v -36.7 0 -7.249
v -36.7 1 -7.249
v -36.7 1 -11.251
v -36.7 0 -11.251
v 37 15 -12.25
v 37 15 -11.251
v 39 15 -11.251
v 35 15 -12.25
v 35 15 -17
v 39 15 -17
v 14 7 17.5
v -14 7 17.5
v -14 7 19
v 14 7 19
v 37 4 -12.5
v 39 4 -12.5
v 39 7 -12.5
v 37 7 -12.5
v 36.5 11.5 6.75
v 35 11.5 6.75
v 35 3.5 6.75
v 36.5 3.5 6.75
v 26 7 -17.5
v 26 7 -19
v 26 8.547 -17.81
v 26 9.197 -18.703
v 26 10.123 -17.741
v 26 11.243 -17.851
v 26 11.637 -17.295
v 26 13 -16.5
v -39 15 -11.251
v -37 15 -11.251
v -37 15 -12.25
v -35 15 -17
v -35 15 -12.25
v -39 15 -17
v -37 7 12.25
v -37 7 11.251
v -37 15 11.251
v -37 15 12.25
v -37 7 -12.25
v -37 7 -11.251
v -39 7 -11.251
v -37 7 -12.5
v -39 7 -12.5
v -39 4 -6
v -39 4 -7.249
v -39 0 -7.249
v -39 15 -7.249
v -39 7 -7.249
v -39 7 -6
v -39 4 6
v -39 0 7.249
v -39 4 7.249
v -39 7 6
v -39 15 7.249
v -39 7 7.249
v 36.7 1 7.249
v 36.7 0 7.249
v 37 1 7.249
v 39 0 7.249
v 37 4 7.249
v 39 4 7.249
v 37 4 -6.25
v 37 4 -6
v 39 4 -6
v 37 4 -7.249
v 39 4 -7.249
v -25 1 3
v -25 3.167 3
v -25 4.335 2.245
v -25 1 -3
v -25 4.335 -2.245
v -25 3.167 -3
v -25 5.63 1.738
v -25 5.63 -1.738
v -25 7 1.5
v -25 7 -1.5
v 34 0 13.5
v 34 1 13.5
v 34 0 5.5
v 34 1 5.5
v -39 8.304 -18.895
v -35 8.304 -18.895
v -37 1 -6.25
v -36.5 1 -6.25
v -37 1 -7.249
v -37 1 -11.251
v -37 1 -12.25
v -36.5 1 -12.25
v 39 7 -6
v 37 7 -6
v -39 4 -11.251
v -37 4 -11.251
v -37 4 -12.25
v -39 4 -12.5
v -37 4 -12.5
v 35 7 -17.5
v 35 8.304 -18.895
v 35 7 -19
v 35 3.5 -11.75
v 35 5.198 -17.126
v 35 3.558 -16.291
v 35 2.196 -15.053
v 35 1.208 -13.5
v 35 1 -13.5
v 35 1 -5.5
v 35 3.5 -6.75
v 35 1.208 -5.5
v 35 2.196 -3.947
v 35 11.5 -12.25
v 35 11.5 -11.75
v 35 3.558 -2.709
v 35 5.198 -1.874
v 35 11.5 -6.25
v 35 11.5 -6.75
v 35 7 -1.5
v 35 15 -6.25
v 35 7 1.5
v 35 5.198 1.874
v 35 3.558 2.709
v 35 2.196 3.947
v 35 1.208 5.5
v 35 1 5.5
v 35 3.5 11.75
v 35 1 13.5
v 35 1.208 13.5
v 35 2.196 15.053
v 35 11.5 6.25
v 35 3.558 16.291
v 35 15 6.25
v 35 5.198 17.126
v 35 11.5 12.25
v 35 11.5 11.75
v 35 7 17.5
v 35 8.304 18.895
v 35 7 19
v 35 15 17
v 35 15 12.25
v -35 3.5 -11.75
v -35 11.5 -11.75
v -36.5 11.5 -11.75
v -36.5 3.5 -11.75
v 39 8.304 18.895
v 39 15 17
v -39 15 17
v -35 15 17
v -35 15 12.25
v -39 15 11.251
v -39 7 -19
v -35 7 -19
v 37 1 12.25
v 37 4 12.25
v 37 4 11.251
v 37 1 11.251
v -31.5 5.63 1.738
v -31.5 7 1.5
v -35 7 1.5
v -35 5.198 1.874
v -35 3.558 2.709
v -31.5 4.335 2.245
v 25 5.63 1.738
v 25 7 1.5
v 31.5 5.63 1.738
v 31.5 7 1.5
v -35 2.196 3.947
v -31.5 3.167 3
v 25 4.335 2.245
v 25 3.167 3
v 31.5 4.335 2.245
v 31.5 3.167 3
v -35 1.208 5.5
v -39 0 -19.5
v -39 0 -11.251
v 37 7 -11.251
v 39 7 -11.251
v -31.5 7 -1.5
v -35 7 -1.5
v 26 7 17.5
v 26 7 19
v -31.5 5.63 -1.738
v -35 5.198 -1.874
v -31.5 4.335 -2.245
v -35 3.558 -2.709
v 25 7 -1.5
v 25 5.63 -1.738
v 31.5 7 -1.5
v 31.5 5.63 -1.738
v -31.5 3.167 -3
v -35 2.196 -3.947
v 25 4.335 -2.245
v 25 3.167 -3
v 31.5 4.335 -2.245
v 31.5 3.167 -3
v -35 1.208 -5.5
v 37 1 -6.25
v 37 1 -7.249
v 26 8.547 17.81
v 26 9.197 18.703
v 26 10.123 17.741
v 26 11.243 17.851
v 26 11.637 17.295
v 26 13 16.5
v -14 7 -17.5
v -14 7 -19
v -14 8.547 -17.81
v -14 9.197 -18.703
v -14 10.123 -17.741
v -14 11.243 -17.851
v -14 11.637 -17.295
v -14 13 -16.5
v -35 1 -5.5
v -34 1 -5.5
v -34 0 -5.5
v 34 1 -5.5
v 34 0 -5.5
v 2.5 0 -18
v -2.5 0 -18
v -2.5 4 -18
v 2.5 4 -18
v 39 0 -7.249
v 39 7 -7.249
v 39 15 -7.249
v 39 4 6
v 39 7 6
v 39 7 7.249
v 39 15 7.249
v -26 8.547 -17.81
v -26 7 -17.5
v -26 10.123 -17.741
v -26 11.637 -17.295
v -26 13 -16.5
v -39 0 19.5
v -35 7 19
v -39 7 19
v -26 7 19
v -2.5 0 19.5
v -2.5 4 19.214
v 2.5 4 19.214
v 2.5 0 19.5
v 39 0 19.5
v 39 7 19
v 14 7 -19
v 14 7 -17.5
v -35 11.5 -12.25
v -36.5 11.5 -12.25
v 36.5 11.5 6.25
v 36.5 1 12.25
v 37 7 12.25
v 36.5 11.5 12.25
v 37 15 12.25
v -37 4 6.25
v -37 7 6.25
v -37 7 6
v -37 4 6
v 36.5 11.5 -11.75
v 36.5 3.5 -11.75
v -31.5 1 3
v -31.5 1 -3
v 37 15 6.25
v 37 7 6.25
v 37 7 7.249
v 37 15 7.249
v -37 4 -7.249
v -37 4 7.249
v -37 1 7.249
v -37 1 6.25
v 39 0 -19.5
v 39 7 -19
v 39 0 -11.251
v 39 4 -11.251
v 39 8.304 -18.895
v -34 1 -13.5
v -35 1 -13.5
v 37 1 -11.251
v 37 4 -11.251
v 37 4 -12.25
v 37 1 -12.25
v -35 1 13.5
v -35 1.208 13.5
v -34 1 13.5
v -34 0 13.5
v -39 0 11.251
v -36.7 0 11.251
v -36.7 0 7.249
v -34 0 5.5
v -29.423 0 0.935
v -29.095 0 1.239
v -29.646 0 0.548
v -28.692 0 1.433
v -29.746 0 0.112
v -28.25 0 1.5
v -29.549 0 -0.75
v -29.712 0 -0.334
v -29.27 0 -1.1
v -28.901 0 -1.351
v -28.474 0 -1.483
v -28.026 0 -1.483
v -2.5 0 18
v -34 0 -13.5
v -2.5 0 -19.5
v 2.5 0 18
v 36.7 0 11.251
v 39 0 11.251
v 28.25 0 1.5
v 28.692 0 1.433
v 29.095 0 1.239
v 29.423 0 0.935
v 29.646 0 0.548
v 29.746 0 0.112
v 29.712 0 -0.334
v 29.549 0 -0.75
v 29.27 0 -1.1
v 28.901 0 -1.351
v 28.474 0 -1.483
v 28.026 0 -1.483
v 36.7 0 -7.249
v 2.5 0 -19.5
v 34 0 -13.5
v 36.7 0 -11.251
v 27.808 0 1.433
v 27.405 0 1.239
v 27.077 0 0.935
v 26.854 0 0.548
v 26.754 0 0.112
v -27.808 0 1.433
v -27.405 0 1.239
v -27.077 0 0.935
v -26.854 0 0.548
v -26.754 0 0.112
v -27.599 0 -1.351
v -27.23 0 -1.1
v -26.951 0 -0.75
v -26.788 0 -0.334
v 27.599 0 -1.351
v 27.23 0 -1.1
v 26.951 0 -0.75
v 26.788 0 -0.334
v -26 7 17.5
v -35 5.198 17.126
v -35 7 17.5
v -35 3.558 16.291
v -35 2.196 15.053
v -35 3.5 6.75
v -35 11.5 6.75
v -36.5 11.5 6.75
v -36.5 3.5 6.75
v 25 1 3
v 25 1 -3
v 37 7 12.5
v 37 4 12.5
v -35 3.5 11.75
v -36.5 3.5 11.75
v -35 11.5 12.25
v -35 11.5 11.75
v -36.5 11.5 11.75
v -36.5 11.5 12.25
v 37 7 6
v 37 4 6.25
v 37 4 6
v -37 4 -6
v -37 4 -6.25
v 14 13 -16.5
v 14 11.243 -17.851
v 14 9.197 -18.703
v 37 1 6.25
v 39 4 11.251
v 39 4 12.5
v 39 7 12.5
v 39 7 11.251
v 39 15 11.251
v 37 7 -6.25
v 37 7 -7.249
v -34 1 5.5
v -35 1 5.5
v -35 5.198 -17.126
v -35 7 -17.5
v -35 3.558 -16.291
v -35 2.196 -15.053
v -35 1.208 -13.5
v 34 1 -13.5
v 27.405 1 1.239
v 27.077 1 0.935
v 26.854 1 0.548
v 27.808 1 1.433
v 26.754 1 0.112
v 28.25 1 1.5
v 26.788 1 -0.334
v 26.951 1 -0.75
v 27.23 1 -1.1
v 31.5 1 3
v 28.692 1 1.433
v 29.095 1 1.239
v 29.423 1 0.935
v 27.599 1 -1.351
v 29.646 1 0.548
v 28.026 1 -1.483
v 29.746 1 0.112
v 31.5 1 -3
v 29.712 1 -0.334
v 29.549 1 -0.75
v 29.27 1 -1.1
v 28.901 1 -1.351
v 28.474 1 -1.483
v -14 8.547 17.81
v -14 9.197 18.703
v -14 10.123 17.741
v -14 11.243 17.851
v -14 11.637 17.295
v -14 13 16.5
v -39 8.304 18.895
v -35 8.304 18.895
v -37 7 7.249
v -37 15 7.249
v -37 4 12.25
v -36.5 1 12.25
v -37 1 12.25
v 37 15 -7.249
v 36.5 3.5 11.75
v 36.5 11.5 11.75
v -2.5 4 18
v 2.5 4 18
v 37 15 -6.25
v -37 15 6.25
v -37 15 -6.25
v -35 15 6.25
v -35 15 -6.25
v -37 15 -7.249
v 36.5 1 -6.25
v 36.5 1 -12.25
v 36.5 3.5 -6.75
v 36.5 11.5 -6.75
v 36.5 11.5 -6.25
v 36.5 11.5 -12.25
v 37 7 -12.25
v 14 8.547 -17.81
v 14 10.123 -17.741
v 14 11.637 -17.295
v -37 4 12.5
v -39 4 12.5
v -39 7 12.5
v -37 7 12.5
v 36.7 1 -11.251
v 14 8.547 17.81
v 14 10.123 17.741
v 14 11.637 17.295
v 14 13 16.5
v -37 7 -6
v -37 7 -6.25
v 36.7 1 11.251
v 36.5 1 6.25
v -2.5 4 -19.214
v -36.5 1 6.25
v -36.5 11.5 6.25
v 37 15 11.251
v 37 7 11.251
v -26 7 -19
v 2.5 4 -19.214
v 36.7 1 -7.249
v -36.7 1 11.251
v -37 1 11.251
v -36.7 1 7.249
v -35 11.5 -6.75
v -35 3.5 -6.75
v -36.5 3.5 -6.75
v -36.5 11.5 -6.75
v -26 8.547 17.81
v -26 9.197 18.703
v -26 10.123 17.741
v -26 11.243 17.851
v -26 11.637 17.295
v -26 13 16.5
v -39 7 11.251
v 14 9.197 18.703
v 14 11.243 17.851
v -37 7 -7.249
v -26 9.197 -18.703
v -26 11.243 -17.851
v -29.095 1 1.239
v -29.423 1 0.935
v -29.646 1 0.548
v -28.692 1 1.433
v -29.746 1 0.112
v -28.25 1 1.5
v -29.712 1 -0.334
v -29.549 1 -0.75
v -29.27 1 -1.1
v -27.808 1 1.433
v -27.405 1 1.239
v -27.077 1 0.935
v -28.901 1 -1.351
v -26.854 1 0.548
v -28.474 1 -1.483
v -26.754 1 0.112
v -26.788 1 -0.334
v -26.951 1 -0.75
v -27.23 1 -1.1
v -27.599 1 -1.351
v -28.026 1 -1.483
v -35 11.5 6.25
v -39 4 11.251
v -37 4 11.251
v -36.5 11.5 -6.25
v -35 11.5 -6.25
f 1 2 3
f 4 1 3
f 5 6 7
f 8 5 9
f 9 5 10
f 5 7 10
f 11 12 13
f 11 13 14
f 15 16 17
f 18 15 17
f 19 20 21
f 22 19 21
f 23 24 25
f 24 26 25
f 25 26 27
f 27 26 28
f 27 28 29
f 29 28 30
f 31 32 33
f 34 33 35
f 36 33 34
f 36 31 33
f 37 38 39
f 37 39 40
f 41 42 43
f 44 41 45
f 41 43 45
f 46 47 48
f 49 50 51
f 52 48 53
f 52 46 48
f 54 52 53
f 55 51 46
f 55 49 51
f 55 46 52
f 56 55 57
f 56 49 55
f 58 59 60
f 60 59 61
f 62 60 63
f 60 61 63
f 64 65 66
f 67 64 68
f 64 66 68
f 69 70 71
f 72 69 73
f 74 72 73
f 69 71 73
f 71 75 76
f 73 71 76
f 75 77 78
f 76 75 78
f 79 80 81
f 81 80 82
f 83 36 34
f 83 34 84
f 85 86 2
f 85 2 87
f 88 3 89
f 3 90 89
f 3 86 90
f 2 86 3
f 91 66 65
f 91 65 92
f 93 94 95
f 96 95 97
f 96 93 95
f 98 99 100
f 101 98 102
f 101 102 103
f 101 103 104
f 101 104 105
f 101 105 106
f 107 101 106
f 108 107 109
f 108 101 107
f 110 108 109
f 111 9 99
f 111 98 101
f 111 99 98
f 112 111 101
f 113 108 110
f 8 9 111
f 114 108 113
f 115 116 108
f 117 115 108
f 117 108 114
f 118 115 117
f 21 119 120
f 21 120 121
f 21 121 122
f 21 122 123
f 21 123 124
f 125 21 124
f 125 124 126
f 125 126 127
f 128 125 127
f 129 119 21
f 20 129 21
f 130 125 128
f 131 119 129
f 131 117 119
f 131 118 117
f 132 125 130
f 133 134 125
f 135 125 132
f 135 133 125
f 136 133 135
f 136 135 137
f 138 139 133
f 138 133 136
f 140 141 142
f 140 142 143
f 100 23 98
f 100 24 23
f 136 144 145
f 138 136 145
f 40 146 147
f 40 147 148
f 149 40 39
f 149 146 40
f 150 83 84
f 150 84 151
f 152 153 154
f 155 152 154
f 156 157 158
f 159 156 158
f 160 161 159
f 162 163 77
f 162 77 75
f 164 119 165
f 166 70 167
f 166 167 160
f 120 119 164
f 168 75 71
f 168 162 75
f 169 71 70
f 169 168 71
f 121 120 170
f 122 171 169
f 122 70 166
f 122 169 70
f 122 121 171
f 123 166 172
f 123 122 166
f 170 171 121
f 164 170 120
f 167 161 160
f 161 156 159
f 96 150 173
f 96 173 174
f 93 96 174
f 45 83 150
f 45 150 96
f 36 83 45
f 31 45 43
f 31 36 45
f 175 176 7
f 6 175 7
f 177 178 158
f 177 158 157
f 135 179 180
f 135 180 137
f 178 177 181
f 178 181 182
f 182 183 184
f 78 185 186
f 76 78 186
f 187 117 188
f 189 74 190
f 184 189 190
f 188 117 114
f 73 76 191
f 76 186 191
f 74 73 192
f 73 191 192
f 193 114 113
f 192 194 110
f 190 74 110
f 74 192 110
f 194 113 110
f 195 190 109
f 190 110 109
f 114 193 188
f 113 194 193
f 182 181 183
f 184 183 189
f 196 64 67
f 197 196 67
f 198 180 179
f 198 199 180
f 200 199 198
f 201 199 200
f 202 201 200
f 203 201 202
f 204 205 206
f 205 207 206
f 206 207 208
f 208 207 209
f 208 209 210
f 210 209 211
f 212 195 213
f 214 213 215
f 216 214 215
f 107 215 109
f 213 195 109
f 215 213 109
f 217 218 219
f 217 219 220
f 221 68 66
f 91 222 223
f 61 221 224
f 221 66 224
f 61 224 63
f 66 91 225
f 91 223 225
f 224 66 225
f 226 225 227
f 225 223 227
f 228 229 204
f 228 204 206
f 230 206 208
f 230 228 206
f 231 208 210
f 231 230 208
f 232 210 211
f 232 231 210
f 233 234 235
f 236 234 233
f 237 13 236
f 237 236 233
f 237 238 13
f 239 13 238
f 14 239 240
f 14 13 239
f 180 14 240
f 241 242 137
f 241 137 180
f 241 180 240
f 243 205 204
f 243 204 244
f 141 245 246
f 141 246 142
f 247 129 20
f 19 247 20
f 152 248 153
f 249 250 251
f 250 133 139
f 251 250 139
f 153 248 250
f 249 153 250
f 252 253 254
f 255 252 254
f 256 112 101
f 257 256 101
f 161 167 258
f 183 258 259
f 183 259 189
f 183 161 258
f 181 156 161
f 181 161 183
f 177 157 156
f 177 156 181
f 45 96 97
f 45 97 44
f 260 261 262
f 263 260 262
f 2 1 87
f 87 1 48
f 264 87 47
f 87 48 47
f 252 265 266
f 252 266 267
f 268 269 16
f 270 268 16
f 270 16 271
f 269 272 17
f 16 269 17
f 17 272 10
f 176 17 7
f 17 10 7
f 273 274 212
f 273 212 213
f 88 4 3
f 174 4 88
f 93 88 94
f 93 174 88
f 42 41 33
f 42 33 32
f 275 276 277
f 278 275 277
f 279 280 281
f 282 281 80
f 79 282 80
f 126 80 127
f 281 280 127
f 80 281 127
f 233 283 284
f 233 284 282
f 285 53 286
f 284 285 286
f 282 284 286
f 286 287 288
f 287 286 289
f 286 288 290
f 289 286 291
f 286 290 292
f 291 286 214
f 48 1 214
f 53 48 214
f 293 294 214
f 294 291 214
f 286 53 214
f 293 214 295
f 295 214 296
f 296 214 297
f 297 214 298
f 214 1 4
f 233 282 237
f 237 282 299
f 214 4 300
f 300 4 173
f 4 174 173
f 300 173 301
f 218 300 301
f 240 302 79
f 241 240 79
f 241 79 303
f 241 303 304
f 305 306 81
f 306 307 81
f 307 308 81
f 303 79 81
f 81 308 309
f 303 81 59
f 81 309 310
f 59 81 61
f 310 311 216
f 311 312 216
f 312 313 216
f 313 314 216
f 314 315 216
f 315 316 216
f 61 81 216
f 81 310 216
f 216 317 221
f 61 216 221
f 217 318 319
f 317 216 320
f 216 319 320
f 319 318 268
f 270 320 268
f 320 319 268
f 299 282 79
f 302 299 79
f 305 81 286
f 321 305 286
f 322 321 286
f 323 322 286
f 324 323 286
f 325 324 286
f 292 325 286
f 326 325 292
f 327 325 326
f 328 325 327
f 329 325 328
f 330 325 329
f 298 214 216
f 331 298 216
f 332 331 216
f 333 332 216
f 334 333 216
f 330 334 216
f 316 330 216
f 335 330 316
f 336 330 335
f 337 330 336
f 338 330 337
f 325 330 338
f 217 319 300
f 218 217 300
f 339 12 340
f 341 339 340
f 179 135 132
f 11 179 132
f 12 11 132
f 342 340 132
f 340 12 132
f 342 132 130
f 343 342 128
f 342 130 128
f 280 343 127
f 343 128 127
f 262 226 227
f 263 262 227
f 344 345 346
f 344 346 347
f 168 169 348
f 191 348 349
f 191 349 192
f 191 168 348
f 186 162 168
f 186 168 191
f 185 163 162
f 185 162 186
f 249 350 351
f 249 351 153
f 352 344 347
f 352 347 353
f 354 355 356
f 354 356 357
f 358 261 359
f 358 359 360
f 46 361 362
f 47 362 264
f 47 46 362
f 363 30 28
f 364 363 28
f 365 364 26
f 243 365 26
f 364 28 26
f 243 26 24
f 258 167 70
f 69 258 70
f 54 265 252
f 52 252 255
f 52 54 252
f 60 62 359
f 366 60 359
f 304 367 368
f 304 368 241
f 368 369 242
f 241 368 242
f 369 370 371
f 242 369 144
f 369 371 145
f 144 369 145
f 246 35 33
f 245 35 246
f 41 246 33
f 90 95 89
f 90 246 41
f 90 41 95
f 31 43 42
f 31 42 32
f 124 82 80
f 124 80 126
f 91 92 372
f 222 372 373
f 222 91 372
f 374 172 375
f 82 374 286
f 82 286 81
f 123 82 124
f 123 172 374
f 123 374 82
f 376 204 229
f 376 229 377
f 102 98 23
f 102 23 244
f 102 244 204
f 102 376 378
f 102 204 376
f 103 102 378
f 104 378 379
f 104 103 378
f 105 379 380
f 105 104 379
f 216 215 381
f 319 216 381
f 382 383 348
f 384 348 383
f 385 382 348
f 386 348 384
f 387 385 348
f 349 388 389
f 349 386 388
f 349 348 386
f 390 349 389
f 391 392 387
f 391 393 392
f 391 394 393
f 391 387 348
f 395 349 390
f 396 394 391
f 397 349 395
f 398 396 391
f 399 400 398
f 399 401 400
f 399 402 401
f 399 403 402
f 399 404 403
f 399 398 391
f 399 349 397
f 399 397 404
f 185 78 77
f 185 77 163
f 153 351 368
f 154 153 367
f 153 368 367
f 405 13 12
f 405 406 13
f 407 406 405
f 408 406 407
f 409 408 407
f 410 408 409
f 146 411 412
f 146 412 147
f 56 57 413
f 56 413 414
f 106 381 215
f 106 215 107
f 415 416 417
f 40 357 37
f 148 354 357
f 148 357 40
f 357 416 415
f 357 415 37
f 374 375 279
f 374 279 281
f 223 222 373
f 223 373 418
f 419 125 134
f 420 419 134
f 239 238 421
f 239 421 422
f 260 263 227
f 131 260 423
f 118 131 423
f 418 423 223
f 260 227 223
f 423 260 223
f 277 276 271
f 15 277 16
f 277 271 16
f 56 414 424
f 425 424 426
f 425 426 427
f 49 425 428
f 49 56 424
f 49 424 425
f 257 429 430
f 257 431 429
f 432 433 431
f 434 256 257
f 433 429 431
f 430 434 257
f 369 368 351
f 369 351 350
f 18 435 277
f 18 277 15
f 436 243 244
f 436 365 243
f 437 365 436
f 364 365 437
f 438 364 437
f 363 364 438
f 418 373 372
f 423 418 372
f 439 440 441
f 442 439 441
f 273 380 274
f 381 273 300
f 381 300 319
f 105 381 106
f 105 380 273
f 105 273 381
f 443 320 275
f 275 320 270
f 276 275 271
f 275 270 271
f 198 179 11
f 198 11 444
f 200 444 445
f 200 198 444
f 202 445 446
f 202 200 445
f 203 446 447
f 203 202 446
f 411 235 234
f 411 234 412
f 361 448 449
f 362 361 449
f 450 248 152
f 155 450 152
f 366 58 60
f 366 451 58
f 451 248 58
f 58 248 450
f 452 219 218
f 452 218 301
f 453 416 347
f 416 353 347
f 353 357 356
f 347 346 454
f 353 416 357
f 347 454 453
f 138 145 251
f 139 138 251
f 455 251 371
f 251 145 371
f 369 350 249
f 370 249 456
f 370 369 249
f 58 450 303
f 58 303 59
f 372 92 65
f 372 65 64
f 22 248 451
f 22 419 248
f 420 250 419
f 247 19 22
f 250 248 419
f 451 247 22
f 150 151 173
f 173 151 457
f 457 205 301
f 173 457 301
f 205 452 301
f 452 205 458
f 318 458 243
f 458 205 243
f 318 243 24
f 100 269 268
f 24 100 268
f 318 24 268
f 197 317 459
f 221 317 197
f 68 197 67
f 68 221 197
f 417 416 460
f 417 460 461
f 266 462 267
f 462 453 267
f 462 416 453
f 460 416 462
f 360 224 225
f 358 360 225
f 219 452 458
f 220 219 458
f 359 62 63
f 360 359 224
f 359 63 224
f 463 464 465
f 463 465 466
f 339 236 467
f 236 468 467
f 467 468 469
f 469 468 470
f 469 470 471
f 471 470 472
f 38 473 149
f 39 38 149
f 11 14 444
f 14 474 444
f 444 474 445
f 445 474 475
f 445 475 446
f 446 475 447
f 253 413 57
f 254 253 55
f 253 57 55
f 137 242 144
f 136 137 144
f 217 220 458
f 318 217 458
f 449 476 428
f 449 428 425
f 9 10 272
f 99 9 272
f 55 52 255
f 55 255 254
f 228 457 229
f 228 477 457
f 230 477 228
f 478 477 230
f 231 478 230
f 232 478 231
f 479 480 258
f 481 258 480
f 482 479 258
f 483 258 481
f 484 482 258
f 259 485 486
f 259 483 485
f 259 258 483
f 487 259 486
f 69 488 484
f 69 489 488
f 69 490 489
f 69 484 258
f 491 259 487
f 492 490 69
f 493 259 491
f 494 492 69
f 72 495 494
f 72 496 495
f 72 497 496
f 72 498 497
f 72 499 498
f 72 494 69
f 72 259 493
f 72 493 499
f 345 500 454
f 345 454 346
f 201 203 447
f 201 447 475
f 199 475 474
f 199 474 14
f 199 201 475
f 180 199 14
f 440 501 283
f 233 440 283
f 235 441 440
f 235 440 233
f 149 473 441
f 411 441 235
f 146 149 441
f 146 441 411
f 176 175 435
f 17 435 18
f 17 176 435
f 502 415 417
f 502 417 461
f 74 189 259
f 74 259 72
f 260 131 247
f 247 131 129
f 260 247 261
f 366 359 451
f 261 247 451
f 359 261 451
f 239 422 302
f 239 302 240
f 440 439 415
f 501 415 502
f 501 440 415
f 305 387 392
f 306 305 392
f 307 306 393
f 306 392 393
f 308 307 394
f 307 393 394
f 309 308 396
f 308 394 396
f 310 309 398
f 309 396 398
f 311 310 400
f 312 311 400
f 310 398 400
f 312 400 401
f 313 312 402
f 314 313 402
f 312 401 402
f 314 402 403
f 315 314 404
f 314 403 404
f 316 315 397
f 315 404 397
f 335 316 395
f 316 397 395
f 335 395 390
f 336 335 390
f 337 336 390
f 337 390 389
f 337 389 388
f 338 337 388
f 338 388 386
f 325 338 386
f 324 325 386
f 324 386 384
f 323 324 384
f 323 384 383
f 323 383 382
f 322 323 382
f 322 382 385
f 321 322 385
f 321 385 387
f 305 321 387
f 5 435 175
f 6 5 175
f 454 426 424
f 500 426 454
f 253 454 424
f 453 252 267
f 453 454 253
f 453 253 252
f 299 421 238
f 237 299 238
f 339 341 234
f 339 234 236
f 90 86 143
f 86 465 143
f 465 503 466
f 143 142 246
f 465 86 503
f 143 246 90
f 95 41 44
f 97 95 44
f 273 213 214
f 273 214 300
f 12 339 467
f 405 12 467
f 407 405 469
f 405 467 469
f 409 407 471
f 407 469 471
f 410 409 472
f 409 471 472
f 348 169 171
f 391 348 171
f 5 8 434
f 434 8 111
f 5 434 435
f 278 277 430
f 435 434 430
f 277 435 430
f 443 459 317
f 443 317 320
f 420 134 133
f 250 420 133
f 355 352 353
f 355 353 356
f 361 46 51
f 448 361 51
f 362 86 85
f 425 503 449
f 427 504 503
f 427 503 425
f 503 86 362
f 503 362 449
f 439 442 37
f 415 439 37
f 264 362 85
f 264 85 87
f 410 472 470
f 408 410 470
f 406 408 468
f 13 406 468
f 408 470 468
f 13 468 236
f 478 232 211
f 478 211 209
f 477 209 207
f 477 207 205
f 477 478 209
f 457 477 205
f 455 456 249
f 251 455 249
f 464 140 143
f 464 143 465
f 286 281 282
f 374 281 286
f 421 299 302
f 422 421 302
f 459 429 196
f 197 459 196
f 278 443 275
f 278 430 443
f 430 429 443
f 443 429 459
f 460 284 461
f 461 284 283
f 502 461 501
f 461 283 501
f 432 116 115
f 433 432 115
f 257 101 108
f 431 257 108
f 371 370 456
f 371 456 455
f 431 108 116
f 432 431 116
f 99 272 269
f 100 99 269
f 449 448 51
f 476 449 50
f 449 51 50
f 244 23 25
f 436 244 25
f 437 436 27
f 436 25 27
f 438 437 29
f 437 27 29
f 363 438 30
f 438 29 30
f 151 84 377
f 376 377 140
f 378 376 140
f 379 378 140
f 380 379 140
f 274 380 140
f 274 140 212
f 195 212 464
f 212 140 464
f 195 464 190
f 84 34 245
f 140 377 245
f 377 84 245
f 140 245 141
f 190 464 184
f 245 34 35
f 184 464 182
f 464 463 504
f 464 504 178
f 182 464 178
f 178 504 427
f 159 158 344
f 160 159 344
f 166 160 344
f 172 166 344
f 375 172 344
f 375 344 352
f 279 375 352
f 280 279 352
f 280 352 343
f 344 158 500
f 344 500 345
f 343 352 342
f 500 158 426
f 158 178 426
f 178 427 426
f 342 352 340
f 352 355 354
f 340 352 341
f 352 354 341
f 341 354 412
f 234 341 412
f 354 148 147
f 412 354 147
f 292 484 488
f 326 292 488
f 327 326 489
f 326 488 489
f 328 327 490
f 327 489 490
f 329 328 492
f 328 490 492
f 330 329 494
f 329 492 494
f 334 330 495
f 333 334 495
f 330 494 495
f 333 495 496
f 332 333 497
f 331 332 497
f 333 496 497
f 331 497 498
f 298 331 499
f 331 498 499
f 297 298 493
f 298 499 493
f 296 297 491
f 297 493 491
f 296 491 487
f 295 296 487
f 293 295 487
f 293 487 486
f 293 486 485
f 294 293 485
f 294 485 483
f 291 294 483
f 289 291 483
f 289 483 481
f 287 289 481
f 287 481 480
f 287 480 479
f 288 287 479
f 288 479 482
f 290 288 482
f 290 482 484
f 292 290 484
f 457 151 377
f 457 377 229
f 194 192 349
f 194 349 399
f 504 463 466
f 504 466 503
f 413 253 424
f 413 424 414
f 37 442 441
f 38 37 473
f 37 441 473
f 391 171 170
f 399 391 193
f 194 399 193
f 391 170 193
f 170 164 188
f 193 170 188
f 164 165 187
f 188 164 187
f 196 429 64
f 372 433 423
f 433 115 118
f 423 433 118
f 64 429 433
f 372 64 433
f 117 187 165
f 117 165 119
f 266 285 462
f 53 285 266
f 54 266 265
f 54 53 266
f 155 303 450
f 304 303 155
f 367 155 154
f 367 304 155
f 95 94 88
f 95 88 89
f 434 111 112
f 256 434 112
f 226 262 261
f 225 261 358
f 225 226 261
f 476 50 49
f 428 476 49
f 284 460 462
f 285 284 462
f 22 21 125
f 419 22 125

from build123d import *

# Parameters (mm, degrees)
SKETCH1_W            = 78
SKETCH1_H            = 39
BOSS_EXTRUDE1_DEPTH  = 7
CUT_EXTRUDE1_DEPTH   = 81.704708661
SKETCH3_W            = 70
SKETCH3_H            = 8
CUT_EXTRUDE2_DEPTH   = 6
CUT_EXTRUDE3_DEPTH   = 70
MIRROR9_COPY_1_DEPTH = 70
MIRROR9_COPY_2_DEPTH = 70
SKETCH5_W            = 68
SKETCH5_H            = 8
CUT_EXTRUDE4_DEPTH   = 45.014202253
BOSS_EXTRUDE2_DEPTH  = 12
MIRROR3_COPY_1_DEPTH = 12
BOSS_EXTRUDE3_DEPTH  = 4
SKETCH9_W            = 6.5
SKETCH9_H            = 3
CUT_EXTRUDE5_DEPTH   = 2
CUT_EXTRUDE6_DEPTH   = 2
SKETCH12_W           = 0.5
SKETCH12_H           = 6
CUT_EXTRUDE11_DEPTH  = 10.5
SKETCH13_W           = 4.001855858
SKETCH13_H           = 15
CUT_EXTRUDE9_DEPTH   = 2.3
SKETCH14_W           = 5
SKETCH14_H           = 1.5
CUT_EXTRUDE10_DEPTH  = 4
SKETCH15_W           = 6.5
SKETCH15_H           = 6
CUT_EXTRUDE12_DEPTH  = 6
CUT_EXTRUDE13_REACH  = 47.796
SKETCH16_R           = 1.5


with BuildPart() as part:
    # Sketch1 → Boss-Extrude1 (new body)
    with BuildSketch(Plane(origin=(0, 0, 0), x_dir=(1, 0, 0), z_dir=(0, 1, 0))):
        Rectangle(SKETCH1_W, SKETCH1_H)
    extrude(amount=BOSS_EXTRUDE1_DEPTH)

    # Sketch2 → Cut-Extrude1 (cut, through all)
    with BuildSketch(Plane(origin=(39, 0, 0), x_dir=(0, 0, -1), z_dir=(1, 0, 0))):
        Polygon((19, 7), (19.5, 0), (19.5, 7), align=None)
        Polygon((-19, 7), (-19.5, 0), (-19.5, 7), align=None)
    extrude(amount=-CUT_EXTRUDE1_DEPTH, mode=Mode.SUBTRACT)

    # Sketch3 → Cut-Extrude2 (cut)
    with BuildSketch(Plane(origin=(0, 7, 0), x_dir=(1, 0, 0), z_dir=(0, 1, 0))):
        with Locations((0, -9.5)):
            Rectangle(SKETCH3_W, SKETCH3_H)
        with Locations((0, 9.5)):
            Rectangle(SKETCH3_W, SKETCH3_H)
    extrude(amount=-CUT_EXTRUDE2_DEPTH, mode=Mode.SUBTRACT)

    # Sketch4 → Cut-Extrude3 (cut)
    with BuildSketch(Plane(origin=(35, 0, 0), x_dir=(0, 0, -1), z_dir=(1, 0, 0))):
        with BuildLine():
            Line((13, 1), (13, 7))
            Line((13, 7), (17.5, 7))
            ThreePointArc((17.5, 7), (16.132310367, 3.338267225), (13, 1))
        make_face()
    cut_extrude3 = extrude(amount=-CUT_EXTRUDE3_DEPTH, mode=Mode.SUBTRACT)

    # Mirror1: Cut-Extrude3 across plane
    add(cut_extrude3.mirror(Plane.XY), mode=Mode.SUBTRACT)

    # Mirror8: Cut-Extrude3 across plane
    add(cut_extrude3.mirror(Plane.XY.offset(-9.5)), mode=Mode.SUBTRACT)

    # Mirror9 copy 1 sketch → Mirror9 copy 1 (cut)
    with BuildSketch(Plane(origin=(35, 0, 19), x_dir=(0, 0, -1), z_dir=(1, 0, 0))):
        with BuildLine():
            Line((13, 1), (13, 7))
            Line((13, 7), (17.5, 7))
            ThreePointArc((17.5, 7), (16.132310367, 3.338267225), (13, 1))
        make_face()
    extrude(amount=-MIRROR9_COPY_1_DEPTH, mode=Mode.SUBTRACT)

    # Mirror9 copy 2 sketch → Mirror9 copy 2 (cut)
    with BuildSketch(Plane(origin=(35, 0, 19), x_dir=(0, 0, 1), z_dir=(1, 0, 0))):
        with BuildLine():
            Line((13, -1), (13, -7))
            Line((13, -7), (17.5, -7))
            ThreePointArc((17.5, -7), (16.132310367, -3.338267225), (13, -1))
        make_face()
    extrude(amount=-MIRROR9_COPY_2_DEPTH, mode=Mode.SUBTRACT)

    # Sketch5 → Cut-Extrude4 (cut, through all)
    with BuildSketch(Plane(origin=(0, 1, 0), x_dir=(1, 0, 0), z_dir=(0, 1, 0))):
        with Locations((0, 9.5)):
            Rectangle(SKETCH5_W, SKETCH5_H)
        with Locations((0, -9.5)):
            Rectangle(SKETCH5_W, SKETCH5_H)
    extrude(amount=-CUT_EXTRUDE4_DEPTH, mode=Mode.SUBTRACT)

    # Sketch6 → Boss-Extrude2 (add)
    with BuildSketch(Plane(origin=(26, 0, 0), x_dir=(0, 0, -1), z_dir=(1, 0, 0))):
        with BuildLine():
            Line((-19, 7), (-17.5, 7))
            ThreePointArc((-17.5, 7), (-17.740958247, 10.123493041), (-16.5, 13))
            ThreePointArc((-16.5, 13), (-18.343954985, 10.247481244), (-19, 7))
        make_face()
    boss_extrude2 = extrude(amount=-BOSS_EXTRUDE2_DEPTH)

    # Mirror2: Boss-Extrude2 across plane
    add(boss_extrude2.mirror(Plane(origin=(0, 0, 0), x_dir=(0, 0, 1), z_dir=(1, 0, 0))))

    # Mirror3: Boss-Extrude2 across plane
    add(boss_extrude2.mirror(Plane.XY))

    # Mirror3 copy 1 sketch → Mirror3 copy 1 (add)
    with BuildSketch(Plane.ZY.offset(26)):
        with BuildLine():
            Line((-19, 7), (-17.5, 7))
            ThreePointArc((-17.5, 7), (-17.740958247, 10.123493041), (-16.5, 13))
            ThreePointArc((-16.5, 13), (-18.343954985, 10.247481244), (-19, 7))
        make_face()
    extrude(amount=-MIRROR3_COPY_1_DEPTH)

    # Sketch8 → Boss-Extrude3 (add)
    with BuildSketch(Plane(origin=(39, 0, 0), x_dir=(0, 0, -1), z_dir=(1, 0, 0))):
        Polygon((-17, 15), (17, 15), (18.894572253, 8.304261216), (19, 7), (-19, 7), (-18.894572253, 8.304261216), align=None)
    boss_extrude3 = extrude(amount=-BOSS_EXTRUDE3_DEPTH)

    # Mirror4: Boss-Extrude3 across plane
    add(boss_extrude3.mirror(Plane(origin=(0, 0, 0), x_dir=(0, 0, 1), z_dir=(1, 0, 0))))

    # Sketch9 → Cut-Extrude5 (cut)
    with BuildSketch(Plane(origin=(39, 0, 0), x_dir=(0, 0, -1), z_dir=(1, 0, 0))):
        with Locations((9.25, 5.5)):
            Rectangle(SKETCH9_W, SKETCH9_H)
        with Locations((-9.25, 5.5)):
            Rectangle(SKETCH9_W, SKETCH9_H)
    cut_extrude5 = extrude(amount=-CUT_EXTRUDE5_DEPTH, mode=Mode.SUBTRACT)

    # Mirror5: Cut-Extrude5 across plane
    add(cut_extrude5.mirror(Plane(origin=(0, 0, 0), x_dir=(0, 0, 1), z_dir=(1, 0, 0))), mode=Mode.SUBTRACT)

    # Sketch11 → Cut-Extrude6 (cut)
    with BuildSketch(Plane.ZY.offset(-35)):
        Polygon((6.75, 3.5), (11.75, 3.5), (11.75, 11.5), (12.25, 11.5), (12.25, 15), (6.25, 15), (6.25, 11.5), (6.75, 11.5), align=None)
        Polygon((-6.75, 11.5), (-6.25, 11.5), (-6.25, 15), (-12.25, 15), (-12.25, 11.5), (-11.75, 11.5), (-11.75, 3.5), (-6.75, 3.5), align=None)
    cut_extrude6 = extrude(amount=-CUT_EXTRUDE6_DEPTH, mode=Mode.SUBTRACT)

    # Sketch12 → Cut-Extrude11 (cut)
    with BuildSketch(Plane(origin=(0, 11.5, 0), x_dir=(1, 0, 0), z_dir=(0, 1, 0))):
        with Locations((36.75, 9.25)):
            Rectangle(SKETCH12_W, SKETCH12_H)
        with Locations((36.75, -9.25)):
            Rectangle(SKETCH12_W, SKETCH12_H)
    cut_extrude11 = extrude(amount=-CUT_EXTRUDE11_DEPTH, mode=Mode.SUBTRACT)

    # Sketch13 → Cut-Extrude9 (cut)
    with BuildSketch(Plane(origin=(39, 0, 0), x_dir=(0, 0, -1), z_dir=(1, 0, 0))):
        with Locations((9.25, 7.5)):
            Rectangle(SKETCH13_W, SKETCH13_H)
        with Locations((-9.25, 7.5)):
            Rectangle(SKETCH13_W, SKETCH13_H)
    cut_extrude9 = extrude(amount=-CUT_EXTRUDE9_DEPTH, mode=Mode.SUBTRACT)

    # Mirror10: Cut-Extrude6, Cut-Extrude11, Cut-Extrude9 across plane
    add(cut_extrude6.mirror(Plane(origin=(0, 0, 0), x_dir=(0, 0, 1), z_dir=(1, 0, 0))), mode=Mode.SUBTRACT)
    add(cut_extrude11.mirror(Plane(origin=(0, 0, 0), x_dir=(0, 0, 1), z_dir=(1, 0, 0))), mode=Mode.SUBTRACT)
    add(cut_extrude9.mirror(Plane(origin=(0, 0, 0), x_dir=(0, 0, 1), z_dir=(1, 0, 0))), mode=Mode.SUBTRACT)

    # Sketch14 → Cut-Extrude10 (cut)
    with BuildSketch(Plane.XZ):
        with Locations((0, 18.75)):
            Rectangle(SKETCH14_W, SKETCH14_H)
    cut_extrude10 = extrude(amount=-CUT_EXTRUDE10_DEPTH, mode=Mode.SUBTRACT)

    # Mirror7: Cut-Extrude10 across plane
    add(cut_extrude10.mirror(Plane.XY), mode=Mode.SUBTRACT)

    # Sketch15 → Cut-Extrude12 (cut)
    with BuildSketch(Plane(origin=(0, 7, 0), x_dir=(1, 0, 0), z_dir=(0, 1, 0))):
        with Locations((-28.25, 0)):
            Rectangle(SKETCH15_W, SKETCH15_H)
        with Locations((28.25, 0)):
            Rectangle(SKETCH15_W, SKETCH15_H)
    extrude(amount=-CUT_EXTRUDE12_DEPTH, mode=Mode.SUBTRACT)

    # Sketch16 → Cut-Extrude13 (cut, up to next)
    with BuildSketch(Plane(origin=(0, 1, 0), x_dir=(1, 0, 0), z_dir=(0, 1, 0)), mode=Mode.PRIVATE) as cut_extrude13_sk1:
        with Locations(Location((-28.25, 0, 0), (0, 0, 270))):
            Circle(SKETCH16_R)
    cut_extrude13_tool1 = extrude(cut_extrude13_sk1.sketch, amount=-CUT_EXTRUDE13_REACH, mode=Mode.PRIVATE) & part.part
    # Sketch16 → Cut-Extrude13 (cut, up to next)
    with BuildSketch(Plane(origin=(0, 1, 0), x_dir=(1, 0, 0), z_dir=(0, 1, 0)), mode=Mode.PRIVATE) as cut_extrude13_sk2:
        with Locations(Location((28.25, 0, 0), (0, 0, 270))):
            Circle(SKETCH16_R)
    cut_extrude13_tool2 = extrude(cut_extrude13_sk2.sketch, amount=-CUT_EXTRUDE13_REACH, mode=Mode.PRIVATE) & part.part
    add(cut_extrude13_tool1.solids().sort_by_distance((-28.25, 1, 0))[0], mode=Mode.SUBTRACT)
    add(cut_extrude13_tool2.solids().sort_by_distance((28.25, 1, 0))[0], mode=Mode.SUBTRACT)


solid = part.part
